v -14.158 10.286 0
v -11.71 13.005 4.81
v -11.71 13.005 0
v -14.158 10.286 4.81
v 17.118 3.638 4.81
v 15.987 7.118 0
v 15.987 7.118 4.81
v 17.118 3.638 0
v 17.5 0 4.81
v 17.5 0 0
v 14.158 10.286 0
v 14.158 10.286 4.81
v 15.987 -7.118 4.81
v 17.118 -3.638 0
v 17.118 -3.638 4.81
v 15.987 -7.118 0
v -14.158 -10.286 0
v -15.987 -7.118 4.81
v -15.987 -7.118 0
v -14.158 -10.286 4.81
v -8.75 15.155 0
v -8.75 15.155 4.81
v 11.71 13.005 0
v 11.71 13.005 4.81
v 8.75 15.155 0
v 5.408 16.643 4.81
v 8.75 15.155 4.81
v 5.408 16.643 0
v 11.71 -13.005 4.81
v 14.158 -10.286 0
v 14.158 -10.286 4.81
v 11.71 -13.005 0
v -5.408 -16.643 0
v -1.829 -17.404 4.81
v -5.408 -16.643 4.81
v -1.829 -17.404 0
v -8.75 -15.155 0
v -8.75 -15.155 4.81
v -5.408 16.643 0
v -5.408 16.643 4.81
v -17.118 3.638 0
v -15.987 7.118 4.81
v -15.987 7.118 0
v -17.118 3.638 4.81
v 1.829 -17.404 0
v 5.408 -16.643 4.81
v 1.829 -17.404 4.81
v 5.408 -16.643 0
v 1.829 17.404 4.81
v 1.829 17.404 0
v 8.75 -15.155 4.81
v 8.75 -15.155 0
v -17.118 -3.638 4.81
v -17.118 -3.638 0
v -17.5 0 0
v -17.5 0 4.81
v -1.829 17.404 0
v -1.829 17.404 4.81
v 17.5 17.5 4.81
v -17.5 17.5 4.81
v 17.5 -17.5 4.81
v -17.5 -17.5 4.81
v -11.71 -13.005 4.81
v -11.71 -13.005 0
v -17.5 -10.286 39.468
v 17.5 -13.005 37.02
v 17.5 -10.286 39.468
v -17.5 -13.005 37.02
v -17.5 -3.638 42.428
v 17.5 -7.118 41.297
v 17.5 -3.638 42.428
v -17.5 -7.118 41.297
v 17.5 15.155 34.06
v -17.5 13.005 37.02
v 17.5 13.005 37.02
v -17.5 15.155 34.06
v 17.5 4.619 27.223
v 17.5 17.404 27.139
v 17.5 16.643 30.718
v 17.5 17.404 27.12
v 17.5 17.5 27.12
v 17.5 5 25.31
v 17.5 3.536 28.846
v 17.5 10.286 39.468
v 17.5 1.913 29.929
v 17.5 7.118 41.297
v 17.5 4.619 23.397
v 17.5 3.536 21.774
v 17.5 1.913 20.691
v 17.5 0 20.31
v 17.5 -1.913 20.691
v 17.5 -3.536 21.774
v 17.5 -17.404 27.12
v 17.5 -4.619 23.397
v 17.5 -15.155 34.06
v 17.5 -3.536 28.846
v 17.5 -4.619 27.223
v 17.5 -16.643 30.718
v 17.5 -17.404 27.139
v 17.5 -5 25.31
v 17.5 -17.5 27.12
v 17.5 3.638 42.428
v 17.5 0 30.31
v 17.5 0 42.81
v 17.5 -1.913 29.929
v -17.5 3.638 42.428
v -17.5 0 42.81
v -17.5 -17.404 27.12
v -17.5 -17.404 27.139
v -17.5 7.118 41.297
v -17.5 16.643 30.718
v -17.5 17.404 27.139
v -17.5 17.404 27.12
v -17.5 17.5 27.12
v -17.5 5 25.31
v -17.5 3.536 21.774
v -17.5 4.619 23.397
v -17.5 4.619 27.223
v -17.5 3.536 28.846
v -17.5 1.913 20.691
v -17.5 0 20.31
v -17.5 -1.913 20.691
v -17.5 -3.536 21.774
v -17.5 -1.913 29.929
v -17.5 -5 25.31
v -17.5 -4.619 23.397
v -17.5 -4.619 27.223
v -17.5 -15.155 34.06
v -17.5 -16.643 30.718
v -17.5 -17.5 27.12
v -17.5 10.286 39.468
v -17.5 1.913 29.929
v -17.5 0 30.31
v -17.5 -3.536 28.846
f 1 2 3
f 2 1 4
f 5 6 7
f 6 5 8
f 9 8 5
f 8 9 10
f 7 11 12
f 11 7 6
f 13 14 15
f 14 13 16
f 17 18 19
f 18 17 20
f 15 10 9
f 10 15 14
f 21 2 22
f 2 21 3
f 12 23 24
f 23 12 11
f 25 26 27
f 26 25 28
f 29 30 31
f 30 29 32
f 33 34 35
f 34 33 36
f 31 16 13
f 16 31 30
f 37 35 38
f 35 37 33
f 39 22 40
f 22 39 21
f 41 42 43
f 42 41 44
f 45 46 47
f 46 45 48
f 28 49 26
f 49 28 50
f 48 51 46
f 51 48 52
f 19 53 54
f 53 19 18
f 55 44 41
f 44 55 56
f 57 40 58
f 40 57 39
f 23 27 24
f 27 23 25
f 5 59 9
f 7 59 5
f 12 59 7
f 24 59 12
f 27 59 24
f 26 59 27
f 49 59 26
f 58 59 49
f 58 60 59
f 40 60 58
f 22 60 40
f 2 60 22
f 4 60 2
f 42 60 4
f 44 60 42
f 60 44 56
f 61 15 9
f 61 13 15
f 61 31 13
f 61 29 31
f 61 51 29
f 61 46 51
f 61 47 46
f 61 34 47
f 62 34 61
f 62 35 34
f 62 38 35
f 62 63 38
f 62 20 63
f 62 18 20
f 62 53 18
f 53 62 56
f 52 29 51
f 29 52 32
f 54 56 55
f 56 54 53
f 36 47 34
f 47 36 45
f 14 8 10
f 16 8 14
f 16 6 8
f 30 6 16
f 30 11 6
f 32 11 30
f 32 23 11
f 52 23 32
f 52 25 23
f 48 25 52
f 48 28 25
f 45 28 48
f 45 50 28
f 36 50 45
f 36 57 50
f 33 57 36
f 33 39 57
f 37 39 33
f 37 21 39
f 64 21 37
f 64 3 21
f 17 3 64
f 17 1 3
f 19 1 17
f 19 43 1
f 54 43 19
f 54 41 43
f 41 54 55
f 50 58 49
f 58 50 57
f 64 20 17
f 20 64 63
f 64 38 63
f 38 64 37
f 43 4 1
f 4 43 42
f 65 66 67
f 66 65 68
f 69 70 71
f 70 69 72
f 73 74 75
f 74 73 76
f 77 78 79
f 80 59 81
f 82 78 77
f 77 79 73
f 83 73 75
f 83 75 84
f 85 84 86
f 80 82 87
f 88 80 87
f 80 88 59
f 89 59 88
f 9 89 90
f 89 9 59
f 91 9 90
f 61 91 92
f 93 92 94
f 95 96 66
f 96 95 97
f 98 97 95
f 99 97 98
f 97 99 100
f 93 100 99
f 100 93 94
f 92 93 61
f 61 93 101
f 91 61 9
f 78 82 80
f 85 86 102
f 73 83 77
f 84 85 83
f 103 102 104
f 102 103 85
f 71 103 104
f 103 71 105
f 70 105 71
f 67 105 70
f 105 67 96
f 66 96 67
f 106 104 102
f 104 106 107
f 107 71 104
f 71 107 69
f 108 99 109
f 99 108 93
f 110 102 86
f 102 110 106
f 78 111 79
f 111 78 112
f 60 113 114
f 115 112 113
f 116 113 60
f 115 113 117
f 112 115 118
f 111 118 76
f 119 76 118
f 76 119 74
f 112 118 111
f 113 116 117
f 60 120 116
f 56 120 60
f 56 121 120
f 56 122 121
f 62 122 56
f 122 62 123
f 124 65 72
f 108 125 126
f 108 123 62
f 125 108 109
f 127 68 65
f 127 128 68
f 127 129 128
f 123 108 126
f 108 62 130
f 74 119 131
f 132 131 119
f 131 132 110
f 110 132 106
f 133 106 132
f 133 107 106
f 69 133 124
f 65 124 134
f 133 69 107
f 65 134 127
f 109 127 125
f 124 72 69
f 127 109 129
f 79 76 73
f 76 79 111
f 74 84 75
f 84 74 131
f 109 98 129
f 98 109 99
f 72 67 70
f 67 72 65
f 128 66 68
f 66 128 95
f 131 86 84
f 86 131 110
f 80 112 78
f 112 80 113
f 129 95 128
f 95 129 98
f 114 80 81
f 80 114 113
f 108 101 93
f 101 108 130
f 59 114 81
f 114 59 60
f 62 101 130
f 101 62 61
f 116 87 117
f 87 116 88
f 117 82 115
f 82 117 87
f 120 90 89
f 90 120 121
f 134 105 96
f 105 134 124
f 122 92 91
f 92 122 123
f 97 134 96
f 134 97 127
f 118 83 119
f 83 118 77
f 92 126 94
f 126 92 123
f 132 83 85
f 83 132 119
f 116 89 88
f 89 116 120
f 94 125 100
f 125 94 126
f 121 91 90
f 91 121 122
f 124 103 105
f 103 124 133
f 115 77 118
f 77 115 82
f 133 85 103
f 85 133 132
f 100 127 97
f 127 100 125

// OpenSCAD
//FAB SCAN ALT LASER HOLDER
//JACK TAYLOR 2016
BASE_DIAMETER=35;
HBD=BASE_DIAMETER/2;
LASER_DIAMETER=10;
PLUG_HEIGHT=4.81;
TURRET_HEIGHT=38 - PLUG_HEIGHT;
   CC = TURRET_HEIGHT-HBD+2*PLUG_HEIGHT;

module turret()
{
    cylinder(r=HBD, h=PLUG_HEIGHT);
 

    union()
    {
    translate([-HBD,0,CC])
    rotate([0,90,0])
    cylinder(r=HBD,h=BASE_DIAMETER);
    }
    {
    translate([-HBD,-HBD,PLUG_HEIGHT])
    cube([BASE_DIAMETER,BASE_DIAMETER,PLUG_HEIGHT+HBD]);
    }

}

difference()
{
turret();
color("blue")
translate([-HBD-1,0,CC])
rotate([0,90,0])
cylinder(r=LASER_DIAMETER/2,h=BASE_DIAMETER+2);
}
